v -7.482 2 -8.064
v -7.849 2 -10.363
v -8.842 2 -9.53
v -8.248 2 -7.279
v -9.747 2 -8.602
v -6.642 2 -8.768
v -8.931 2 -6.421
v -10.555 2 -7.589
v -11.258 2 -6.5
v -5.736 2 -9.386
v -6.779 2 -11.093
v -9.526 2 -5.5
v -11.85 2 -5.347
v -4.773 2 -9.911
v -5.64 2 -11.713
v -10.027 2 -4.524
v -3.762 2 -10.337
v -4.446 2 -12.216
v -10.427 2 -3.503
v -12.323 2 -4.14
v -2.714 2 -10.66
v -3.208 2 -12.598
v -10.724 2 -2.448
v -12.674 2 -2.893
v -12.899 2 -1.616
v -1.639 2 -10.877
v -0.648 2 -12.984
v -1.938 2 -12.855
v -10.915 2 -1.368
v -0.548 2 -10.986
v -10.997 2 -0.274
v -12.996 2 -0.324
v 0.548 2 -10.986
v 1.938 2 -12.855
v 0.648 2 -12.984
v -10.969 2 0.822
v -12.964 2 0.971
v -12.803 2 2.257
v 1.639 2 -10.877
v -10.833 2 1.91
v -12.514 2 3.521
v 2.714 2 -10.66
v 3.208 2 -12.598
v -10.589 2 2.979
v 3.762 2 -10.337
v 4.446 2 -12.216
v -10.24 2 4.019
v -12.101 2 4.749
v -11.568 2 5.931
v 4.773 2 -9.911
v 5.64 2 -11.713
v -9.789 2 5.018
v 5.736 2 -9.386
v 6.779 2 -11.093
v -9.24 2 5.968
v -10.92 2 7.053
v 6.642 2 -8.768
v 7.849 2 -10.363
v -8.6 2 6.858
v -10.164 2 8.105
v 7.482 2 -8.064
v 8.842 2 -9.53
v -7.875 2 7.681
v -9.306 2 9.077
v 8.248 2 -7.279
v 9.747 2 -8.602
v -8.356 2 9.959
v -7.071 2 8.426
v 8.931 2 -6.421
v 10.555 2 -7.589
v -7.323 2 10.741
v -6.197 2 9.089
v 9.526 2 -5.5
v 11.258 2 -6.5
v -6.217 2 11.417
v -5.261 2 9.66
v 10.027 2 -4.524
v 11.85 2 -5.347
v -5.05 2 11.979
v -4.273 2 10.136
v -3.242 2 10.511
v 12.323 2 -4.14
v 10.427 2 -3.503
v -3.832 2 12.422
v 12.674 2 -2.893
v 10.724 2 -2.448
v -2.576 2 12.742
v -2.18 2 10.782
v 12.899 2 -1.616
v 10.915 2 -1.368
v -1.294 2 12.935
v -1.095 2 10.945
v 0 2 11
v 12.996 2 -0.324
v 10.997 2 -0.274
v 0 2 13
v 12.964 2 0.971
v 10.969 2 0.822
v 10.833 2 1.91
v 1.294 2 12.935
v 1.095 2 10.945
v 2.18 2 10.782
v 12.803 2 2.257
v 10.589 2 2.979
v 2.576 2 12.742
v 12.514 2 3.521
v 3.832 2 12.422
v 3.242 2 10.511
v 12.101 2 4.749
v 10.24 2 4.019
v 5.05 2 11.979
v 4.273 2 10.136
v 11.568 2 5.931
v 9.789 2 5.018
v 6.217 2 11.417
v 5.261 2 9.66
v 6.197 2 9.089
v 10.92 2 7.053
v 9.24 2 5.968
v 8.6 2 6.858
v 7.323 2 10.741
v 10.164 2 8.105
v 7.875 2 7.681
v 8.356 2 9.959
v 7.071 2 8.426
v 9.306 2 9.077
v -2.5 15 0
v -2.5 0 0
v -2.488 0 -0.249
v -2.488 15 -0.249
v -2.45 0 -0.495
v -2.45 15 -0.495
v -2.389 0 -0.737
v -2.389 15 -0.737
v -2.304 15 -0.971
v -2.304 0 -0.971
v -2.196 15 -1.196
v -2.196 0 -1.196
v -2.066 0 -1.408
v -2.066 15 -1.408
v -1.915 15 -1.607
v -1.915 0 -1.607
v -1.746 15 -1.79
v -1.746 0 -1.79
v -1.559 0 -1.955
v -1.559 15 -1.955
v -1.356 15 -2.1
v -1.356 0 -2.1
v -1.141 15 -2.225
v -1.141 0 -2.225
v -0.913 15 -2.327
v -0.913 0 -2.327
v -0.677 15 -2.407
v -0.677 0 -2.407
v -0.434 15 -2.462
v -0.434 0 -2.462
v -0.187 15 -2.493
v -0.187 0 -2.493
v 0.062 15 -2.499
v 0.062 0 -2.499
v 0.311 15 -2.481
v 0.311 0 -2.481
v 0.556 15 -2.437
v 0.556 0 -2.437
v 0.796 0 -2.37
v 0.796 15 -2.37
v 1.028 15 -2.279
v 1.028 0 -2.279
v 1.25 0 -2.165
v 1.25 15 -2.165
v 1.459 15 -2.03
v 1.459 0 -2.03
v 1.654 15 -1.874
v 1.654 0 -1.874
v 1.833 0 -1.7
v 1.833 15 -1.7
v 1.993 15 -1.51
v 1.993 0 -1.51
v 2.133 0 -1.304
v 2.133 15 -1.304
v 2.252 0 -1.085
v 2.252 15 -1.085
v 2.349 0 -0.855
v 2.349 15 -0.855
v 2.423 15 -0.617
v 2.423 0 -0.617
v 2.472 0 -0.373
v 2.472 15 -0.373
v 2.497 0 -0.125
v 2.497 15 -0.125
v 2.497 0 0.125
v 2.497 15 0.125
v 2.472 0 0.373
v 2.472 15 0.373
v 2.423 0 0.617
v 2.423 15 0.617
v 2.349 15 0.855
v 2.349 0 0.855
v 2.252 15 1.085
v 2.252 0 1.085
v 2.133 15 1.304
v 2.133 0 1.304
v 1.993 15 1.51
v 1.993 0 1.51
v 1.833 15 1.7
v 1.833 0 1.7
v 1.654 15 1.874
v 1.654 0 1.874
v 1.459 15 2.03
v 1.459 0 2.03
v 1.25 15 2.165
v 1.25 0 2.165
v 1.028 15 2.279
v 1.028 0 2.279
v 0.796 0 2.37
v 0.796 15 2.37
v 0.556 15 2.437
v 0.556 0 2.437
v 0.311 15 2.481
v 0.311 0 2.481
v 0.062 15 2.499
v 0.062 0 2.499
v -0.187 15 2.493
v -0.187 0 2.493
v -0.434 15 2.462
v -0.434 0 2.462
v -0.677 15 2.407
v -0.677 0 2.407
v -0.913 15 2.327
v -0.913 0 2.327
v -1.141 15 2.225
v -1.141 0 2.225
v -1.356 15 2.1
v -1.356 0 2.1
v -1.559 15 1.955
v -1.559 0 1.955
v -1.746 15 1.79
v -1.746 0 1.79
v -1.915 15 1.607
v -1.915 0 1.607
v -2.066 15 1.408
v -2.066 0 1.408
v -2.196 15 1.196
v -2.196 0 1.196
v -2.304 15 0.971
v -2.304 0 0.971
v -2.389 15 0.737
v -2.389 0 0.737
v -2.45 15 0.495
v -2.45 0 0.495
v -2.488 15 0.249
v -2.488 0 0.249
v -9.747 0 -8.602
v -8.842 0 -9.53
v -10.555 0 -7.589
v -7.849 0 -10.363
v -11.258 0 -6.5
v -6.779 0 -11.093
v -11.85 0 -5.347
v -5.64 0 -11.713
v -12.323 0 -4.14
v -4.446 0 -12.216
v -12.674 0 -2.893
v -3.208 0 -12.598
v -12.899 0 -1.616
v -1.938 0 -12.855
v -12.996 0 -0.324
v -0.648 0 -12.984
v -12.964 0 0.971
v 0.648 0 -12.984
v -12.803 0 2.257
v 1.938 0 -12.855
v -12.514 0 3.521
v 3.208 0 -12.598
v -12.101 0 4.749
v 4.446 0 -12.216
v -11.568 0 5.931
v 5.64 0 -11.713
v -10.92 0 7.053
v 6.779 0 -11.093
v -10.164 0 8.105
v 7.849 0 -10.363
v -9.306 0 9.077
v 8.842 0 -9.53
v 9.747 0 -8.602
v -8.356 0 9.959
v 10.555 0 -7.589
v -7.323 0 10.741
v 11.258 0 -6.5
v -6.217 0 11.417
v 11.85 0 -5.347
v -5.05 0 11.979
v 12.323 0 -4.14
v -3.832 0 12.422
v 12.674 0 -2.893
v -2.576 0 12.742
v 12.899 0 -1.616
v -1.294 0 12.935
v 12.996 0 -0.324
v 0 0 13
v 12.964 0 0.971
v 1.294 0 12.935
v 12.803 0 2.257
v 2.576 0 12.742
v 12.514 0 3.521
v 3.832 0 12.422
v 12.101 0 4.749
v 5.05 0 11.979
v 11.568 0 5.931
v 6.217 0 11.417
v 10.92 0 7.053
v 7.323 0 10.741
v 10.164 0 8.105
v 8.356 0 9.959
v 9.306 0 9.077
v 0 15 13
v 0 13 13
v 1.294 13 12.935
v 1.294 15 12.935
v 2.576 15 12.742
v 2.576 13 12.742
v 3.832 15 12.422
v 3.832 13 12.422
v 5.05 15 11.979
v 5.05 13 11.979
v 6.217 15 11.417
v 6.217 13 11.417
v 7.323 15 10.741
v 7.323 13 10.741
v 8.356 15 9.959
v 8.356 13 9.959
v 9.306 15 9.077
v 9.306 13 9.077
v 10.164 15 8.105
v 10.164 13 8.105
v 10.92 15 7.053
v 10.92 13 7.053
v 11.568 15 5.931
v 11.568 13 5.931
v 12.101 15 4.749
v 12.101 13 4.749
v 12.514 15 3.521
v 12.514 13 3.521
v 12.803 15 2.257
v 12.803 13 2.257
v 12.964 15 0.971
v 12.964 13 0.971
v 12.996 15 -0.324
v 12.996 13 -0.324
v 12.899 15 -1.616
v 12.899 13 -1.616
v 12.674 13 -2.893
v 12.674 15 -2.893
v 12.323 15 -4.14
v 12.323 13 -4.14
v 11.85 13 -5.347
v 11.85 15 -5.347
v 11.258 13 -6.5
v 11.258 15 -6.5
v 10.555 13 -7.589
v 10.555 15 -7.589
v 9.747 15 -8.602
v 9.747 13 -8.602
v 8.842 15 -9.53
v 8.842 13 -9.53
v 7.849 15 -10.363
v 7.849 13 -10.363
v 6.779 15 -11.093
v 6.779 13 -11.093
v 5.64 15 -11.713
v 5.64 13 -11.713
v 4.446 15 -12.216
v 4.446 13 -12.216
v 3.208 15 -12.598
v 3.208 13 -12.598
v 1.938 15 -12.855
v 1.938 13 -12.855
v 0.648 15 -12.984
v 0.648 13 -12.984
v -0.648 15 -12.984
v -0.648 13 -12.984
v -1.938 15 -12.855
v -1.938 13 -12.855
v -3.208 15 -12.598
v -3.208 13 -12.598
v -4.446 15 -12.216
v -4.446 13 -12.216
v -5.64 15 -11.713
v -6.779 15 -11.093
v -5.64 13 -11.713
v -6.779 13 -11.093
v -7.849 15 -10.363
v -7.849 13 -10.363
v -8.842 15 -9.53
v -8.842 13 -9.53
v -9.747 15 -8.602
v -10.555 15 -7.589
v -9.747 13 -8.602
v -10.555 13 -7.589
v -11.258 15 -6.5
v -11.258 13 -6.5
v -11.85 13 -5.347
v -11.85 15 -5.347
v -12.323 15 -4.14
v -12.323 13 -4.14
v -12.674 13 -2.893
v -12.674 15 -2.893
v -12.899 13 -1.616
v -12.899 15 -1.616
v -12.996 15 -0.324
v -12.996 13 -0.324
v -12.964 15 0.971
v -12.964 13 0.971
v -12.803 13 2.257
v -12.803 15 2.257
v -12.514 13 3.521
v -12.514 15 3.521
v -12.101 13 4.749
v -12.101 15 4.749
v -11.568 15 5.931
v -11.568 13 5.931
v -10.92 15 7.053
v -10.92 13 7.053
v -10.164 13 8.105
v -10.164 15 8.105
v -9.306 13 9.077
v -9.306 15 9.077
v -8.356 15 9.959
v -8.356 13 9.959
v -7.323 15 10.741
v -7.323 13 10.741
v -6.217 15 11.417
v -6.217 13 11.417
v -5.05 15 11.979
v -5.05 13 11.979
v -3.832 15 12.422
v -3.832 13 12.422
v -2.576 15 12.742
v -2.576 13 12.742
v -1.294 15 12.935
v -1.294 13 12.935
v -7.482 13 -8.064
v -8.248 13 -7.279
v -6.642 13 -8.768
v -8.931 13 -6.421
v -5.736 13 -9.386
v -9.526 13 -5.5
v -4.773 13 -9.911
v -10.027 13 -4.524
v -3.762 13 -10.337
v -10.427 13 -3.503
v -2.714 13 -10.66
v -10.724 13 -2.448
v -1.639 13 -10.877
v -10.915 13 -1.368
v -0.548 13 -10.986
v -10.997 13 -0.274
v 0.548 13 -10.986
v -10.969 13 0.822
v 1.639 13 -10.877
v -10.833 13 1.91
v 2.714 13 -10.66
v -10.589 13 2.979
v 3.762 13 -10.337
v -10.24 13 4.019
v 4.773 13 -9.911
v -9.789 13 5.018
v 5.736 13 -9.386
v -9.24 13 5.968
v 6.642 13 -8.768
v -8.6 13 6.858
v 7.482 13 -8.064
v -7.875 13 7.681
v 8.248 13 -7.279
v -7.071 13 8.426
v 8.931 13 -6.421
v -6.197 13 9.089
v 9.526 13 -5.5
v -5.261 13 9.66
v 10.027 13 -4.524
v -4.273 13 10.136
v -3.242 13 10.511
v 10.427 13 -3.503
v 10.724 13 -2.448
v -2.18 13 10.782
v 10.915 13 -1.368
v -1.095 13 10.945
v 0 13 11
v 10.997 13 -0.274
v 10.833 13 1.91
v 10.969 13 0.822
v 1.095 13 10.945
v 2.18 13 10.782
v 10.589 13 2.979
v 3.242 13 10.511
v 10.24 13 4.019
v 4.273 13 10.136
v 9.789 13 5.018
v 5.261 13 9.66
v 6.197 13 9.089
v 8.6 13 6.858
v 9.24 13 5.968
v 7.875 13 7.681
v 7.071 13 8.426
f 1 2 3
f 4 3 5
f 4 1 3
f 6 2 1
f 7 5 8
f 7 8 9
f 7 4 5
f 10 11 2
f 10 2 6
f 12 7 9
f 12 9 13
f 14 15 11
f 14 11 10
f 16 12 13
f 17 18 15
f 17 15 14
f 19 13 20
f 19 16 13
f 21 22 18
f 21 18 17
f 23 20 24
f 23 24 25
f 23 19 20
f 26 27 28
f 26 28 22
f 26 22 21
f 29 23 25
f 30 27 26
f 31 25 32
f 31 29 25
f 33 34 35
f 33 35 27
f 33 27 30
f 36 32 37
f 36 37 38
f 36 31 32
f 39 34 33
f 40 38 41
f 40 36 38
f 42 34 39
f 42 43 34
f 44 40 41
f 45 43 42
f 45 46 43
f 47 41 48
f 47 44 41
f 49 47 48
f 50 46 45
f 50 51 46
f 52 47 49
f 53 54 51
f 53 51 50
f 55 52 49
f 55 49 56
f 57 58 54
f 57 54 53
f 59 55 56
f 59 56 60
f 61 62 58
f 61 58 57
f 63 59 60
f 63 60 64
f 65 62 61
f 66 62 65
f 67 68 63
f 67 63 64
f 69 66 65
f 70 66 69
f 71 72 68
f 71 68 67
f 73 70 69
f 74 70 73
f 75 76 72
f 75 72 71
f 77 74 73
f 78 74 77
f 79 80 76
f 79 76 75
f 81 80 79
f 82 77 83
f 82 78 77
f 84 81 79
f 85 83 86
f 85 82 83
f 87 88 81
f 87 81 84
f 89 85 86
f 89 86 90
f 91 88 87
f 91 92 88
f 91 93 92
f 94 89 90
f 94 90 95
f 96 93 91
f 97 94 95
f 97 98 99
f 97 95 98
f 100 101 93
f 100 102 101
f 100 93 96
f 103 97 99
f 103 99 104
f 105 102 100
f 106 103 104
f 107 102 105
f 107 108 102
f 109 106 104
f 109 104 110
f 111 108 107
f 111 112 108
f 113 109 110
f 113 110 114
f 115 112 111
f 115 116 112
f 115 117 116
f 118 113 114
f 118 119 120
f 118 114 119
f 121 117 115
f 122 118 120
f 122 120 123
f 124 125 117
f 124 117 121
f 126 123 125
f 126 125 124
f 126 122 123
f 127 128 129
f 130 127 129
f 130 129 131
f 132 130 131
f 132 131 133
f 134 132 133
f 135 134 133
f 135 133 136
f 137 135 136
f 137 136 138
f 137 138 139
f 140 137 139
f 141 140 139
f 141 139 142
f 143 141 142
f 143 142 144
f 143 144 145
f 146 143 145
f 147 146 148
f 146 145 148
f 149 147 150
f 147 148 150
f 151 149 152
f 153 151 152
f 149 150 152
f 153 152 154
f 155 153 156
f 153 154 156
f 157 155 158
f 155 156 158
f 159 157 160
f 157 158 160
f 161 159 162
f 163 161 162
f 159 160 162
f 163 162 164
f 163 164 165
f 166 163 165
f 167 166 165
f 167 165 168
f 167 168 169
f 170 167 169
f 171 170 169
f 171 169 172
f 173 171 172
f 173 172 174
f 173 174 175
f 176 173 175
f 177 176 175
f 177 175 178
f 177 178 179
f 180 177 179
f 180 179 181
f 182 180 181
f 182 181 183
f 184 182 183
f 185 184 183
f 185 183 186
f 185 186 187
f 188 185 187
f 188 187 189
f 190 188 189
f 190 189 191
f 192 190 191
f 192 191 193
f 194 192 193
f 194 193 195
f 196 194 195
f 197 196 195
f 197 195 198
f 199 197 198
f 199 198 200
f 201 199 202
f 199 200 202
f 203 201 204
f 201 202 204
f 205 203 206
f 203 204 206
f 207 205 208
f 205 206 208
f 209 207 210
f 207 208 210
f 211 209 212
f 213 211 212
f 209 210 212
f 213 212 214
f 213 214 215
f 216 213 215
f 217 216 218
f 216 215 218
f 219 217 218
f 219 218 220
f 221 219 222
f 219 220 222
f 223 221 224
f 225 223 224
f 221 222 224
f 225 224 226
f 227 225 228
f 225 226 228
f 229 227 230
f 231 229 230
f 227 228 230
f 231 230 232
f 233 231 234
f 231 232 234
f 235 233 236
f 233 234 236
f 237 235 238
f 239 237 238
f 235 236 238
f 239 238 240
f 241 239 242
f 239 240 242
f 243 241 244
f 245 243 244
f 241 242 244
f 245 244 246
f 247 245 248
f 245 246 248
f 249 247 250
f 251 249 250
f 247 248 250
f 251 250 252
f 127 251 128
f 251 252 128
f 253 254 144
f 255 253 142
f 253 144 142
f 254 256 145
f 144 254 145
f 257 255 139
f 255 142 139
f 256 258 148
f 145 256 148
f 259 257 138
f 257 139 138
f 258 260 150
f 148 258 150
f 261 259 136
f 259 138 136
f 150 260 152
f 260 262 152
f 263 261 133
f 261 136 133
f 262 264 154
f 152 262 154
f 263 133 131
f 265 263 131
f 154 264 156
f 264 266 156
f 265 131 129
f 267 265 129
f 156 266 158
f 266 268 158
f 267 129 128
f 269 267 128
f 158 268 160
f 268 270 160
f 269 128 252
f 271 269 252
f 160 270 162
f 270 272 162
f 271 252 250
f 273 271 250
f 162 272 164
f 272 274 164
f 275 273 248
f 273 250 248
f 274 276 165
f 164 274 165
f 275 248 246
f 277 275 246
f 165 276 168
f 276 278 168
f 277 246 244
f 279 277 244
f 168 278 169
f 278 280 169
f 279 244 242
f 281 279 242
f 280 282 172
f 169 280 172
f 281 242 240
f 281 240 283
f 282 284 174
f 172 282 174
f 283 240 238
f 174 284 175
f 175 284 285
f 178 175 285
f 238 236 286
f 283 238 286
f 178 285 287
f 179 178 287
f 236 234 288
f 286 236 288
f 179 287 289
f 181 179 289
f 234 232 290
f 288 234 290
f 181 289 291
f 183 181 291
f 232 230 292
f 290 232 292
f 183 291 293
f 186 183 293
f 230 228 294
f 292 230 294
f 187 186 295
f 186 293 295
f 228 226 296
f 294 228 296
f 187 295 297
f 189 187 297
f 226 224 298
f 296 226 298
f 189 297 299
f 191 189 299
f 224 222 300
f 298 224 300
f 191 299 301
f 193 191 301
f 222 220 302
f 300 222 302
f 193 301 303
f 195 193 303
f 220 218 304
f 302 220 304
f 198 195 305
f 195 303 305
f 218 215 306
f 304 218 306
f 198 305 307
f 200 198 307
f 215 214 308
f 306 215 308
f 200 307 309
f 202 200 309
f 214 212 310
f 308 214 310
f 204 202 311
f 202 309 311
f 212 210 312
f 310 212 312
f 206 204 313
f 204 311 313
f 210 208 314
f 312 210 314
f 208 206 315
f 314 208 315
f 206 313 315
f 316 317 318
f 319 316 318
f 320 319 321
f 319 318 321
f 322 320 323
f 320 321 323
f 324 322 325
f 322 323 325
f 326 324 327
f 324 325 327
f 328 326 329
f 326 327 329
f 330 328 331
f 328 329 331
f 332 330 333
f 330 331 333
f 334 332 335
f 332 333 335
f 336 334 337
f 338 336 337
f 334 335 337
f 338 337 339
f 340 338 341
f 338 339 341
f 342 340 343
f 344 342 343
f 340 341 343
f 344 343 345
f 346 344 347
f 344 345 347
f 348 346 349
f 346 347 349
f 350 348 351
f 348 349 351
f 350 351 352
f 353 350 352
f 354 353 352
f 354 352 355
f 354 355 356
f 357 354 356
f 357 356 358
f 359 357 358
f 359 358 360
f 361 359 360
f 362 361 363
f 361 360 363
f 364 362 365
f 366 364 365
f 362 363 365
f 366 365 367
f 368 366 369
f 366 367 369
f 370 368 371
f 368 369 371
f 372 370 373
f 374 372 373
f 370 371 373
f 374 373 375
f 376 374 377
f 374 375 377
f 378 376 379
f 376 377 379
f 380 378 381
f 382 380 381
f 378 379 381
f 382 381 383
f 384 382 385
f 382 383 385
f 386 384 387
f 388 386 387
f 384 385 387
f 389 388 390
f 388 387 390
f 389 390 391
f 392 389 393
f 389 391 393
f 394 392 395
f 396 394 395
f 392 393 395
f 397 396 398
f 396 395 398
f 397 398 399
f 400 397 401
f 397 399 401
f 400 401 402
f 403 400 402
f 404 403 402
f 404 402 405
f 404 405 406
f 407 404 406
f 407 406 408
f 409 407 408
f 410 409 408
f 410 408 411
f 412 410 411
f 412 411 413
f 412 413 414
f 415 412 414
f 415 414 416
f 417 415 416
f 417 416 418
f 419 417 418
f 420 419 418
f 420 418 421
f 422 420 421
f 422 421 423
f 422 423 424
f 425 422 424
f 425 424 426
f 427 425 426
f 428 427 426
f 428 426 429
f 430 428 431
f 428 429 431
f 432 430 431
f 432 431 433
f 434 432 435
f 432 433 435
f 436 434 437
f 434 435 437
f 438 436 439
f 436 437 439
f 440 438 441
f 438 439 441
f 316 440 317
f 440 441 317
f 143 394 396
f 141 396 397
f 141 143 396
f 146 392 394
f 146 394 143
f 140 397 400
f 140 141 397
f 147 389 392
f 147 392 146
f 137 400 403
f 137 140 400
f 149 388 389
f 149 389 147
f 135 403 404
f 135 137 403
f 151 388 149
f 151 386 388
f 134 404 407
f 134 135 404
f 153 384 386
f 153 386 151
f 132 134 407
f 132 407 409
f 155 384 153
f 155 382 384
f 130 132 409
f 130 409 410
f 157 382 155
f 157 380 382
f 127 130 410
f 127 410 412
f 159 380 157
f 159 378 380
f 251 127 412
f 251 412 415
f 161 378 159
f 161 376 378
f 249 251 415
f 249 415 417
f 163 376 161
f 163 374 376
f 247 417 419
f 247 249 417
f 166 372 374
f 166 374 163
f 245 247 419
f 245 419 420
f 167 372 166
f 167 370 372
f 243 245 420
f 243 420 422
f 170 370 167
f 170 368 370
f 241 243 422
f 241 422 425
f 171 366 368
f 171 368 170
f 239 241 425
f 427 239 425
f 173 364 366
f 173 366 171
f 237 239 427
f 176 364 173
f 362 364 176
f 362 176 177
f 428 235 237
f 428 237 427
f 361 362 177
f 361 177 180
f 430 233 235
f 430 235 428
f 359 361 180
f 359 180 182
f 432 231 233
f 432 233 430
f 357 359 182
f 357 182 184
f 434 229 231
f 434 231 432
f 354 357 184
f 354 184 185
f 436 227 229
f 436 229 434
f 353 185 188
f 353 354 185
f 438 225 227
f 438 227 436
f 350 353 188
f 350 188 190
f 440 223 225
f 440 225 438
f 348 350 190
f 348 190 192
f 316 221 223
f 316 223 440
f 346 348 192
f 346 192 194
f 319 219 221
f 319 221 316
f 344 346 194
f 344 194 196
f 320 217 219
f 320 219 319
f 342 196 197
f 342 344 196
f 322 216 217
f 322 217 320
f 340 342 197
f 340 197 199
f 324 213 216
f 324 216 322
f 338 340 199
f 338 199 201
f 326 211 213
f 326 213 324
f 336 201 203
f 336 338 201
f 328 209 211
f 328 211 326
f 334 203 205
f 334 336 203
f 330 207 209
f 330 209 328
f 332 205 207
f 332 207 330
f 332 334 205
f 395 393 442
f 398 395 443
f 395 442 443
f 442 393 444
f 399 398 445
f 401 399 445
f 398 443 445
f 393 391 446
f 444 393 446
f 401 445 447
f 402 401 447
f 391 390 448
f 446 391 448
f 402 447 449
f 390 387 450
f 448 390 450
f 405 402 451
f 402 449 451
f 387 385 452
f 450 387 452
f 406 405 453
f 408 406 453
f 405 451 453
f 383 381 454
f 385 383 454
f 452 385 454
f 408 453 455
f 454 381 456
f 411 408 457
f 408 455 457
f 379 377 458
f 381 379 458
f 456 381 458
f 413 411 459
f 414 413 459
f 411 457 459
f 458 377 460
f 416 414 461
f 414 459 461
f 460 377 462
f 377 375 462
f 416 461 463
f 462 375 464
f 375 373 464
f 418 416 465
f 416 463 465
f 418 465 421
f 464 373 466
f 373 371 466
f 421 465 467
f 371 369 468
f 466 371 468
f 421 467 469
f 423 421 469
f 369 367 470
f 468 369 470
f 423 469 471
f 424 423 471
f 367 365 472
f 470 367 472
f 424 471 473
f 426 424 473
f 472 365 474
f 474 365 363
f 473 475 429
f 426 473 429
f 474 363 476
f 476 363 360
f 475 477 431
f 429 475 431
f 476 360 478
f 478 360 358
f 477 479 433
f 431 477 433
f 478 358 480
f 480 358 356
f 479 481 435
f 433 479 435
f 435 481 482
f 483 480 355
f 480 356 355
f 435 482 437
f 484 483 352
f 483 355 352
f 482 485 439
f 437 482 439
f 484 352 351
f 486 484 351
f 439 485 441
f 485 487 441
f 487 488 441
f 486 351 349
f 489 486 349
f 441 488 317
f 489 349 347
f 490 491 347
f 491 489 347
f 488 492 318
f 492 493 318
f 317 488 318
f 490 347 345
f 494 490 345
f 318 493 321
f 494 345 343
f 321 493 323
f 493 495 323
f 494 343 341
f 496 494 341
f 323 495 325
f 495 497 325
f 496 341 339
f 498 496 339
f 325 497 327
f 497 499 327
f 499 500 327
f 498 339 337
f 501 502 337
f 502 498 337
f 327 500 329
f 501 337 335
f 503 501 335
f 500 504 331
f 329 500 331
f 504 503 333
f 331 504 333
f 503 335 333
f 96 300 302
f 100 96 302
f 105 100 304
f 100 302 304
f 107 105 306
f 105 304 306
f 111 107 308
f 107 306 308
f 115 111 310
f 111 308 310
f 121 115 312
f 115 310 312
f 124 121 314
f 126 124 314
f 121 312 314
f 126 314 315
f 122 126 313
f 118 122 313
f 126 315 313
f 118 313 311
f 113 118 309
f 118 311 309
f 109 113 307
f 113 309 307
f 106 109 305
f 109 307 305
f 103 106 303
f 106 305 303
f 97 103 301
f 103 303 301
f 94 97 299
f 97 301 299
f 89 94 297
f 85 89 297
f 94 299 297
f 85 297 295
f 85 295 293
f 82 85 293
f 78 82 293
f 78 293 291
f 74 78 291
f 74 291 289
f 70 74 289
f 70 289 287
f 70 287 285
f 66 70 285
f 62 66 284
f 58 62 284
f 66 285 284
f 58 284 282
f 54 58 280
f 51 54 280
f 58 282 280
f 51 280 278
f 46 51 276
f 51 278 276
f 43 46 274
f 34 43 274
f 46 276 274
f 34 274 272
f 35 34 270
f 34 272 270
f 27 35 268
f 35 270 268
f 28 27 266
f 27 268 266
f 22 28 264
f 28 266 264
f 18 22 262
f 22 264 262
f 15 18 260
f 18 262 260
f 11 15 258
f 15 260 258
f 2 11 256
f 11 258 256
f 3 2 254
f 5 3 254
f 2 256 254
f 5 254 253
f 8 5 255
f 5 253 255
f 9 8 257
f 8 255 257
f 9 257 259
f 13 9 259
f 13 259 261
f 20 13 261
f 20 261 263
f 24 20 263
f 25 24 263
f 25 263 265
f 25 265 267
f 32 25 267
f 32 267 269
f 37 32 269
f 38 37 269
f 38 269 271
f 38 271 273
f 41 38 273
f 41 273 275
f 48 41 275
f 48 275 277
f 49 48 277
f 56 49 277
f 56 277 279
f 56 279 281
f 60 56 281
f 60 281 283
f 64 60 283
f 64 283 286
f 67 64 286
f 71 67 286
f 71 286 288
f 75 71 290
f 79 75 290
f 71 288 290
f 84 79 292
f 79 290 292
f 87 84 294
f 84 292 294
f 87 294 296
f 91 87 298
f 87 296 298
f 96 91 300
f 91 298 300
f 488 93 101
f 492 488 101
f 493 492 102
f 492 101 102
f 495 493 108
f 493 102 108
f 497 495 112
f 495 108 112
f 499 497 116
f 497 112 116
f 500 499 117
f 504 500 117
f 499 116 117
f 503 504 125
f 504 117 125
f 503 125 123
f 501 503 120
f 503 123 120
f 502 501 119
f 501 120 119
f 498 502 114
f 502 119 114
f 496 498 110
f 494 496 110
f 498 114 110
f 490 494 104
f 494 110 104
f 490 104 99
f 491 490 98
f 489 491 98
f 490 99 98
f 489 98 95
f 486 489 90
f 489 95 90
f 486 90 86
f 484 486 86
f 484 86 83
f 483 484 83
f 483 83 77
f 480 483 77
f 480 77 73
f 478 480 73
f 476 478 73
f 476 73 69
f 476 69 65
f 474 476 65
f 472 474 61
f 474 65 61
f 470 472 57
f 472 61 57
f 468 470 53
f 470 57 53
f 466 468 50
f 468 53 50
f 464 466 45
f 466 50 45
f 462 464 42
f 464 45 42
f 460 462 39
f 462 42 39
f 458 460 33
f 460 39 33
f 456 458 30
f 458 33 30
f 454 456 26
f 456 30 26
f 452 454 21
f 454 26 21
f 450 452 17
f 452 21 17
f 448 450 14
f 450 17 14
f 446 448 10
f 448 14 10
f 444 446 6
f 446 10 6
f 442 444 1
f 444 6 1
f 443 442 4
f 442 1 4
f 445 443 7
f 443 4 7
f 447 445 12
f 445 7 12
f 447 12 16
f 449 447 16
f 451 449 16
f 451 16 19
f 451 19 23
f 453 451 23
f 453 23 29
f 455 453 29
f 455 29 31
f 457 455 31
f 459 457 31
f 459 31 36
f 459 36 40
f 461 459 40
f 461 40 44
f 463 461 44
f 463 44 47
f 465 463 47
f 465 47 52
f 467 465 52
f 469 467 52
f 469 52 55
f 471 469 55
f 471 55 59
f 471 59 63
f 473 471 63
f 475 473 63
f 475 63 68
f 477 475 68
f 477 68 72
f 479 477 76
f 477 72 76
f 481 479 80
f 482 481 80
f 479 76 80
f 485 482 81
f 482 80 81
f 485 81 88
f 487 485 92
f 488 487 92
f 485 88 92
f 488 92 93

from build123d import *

# Parameters (mm, degrees)
SKETCH_1_R      = 13
EXTRUDE_1_DEPTH = 2
SKETCH_2_R      = 11
EXTRUDE_2_DEPTH = 11
SKETCH_3_R      = 13
EXTRUDE_3_DEPTH = 2
HOLE_WIZARD_1_D = 5


with BuildPart() as part:
    # 草图1 → 凸台-拉伸1 (new body)
    with BuildSketch(Plane(origin=(0, 0, 0), x_dir=(1, 0, 0), z_dir=(0, 1, 0))):
        with Locations(Location((0, 0, 0), (0, 0, 270))):
            Circle(SKETCH_1_R)
    extrude(amount=EXTRUDE_1_DEPTH)

    # 草图2 → 凸台-拉伸2 (add)
    with BuildSketch(Plane(origin=(0, 2, 0), x_dir=(1, 0, 0), z_dir=(0, 1, 0))):
        with Locations(Location((0, 0, 0), (0, 0, 270))):
            Circle(SKETCH_2_R)
    extrude(amount=EXTRUDE_2_DEPTH)

    # 草图3 → 凸台-拉伸3 (add)
    with BuildSketch(Plane(origin=(0, 13, 0), x_dir=(1, 0, 0), z_dir=(0, 1, 0))):
        with Locations(Location((0, 0, 0), (0, 0, 270))):
            Circle(SKETCH_3_R)
    extrude(amount=EXTRUDE_3_DEPTH)

    # 孔1 (through all)
    with Locations(Plane(origin=(0, 15, 0), x_dir=(1, 0, 0), z_dir=(0, 1, 0))):
        with Locations((0, 0)):
            Hole(HOLE_WIZARD_1_D / 2)


solid = part.part
